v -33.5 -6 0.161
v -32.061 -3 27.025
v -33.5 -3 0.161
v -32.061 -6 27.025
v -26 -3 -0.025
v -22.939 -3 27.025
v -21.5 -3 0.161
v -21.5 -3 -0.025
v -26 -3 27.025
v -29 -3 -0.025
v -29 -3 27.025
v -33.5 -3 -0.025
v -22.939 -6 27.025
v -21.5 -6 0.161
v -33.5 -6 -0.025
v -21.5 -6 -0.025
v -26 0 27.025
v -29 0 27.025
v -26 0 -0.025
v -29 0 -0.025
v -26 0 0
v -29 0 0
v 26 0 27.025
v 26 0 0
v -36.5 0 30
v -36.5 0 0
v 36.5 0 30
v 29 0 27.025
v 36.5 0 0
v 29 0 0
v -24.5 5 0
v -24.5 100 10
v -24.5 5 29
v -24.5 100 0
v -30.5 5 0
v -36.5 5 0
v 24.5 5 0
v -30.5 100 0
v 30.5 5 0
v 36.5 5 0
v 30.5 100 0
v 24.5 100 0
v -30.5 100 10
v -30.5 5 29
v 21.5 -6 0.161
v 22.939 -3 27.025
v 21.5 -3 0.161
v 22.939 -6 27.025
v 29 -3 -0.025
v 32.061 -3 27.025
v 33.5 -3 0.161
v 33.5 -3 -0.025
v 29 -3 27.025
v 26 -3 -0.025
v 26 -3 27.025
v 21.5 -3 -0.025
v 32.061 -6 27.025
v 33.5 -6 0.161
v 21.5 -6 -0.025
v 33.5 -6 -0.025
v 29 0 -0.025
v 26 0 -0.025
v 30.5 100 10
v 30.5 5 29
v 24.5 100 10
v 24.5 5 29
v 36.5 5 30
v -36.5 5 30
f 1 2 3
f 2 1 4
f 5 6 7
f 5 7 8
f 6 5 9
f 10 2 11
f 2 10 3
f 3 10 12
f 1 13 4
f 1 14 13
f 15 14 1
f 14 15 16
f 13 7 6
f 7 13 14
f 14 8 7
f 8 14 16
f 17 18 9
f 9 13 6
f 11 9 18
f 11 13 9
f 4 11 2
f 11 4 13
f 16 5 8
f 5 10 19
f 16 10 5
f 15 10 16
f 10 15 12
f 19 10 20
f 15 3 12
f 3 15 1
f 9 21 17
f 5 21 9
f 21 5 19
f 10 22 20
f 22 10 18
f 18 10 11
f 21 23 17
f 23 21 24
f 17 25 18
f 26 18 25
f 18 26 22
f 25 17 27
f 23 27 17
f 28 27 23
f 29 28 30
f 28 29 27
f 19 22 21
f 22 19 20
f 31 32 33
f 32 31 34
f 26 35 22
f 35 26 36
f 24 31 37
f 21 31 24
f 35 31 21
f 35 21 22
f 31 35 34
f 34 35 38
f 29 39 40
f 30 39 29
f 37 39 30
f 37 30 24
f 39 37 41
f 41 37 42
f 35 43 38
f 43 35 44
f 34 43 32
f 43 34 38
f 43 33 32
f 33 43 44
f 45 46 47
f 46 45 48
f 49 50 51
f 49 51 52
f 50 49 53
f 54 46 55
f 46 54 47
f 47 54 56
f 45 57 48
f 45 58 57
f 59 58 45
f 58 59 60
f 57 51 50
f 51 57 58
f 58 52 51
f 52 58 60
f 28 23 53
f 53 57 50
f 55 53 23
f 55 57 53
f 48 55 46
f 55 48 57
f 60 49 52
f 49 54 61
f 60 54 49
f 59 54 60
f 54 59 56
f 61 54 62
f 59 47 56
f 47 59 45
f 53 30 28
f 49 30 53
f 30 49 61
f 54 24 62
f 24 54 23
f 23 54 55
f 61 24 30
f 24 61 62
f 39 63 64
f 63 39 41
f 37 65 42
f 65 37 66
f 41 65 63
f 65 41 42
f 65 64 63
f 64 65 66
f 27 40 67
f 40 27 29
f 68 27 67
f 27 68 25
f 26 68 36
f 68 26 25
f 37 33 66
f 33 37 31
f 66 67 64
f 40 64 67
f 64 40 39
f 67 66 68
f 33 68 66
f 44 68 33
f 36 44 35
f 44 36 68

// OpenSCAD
// file: tslot.scad
include <config.scad>
use <GDMUtils.scad>



module lock_tab(h=30, wall=3, slop=0.0)
{
	s1 = 2*wall-slop/2;
	s2 = wall-slop/2;
	ang = atan(((s1-s2)/2)/(h-2));
	translate([0, -(1.5*wall), 0]) union () {
		intersection() {
			yrot( ang) translate([0,0,(h+5)/2])
				cube(size=[s1*2, wall-2*slop, h+10], center=true);
			yrot(-ang) translate([0,0,(h+5)/2])
				cube(size=[s1*2, wall-2*slop, h+10], center=true);
			translate([0,0,(h-wall-slop)/2])
				cube(size=[s1*2, wall-2*slop, h-wall-slop+0.05], center=true);
		}
	}
	translate([0, -(wall+slop/2)/2-0.05, (h-wall-slop)/2])
		cube(size=[wall-2*slop, wall+slop/2+0.1, h-wall-slop+0.05], center=true);
}
//lock_tab(h=30, wall=2, slop=-0.9);



module lock_slot(h=30, wall=3, backing=0, slop=0.3)
{
	s1 = 2*wall+slop/2;
	s2 = wall+slop/2;
	w = 2*s1+2*wall;
	d = wall*3+slop;
	ang = atan(((s1-s2)/2)/(h-2));
	translate([0, (d+backing)/2, 0]) {
		difference() {
			intersection() {
				yrot( ang) translate([0, 0, (h+5)/2])
					cube(size=[w, d+backing, h+10], center=true);
				yrot(-ang) translate([0, 0, (h+5)/2])
					cube(size=[w, d+backing, h+10], center=true);
				translate([0, 0, h/2])
					cube(size=[w, d+backing, h], center=true);
			}
			translate([0, (d+backing)/2+0.05, -0.05])
				lock_tab(h=h, wall=wall, slop=-slop);
		}
	}
}
//!lock_slot(h=30, wall=2, slop=0.5);



// vim: noexpandtab tabstop=4 shiftwidth=4 softtabstop=4 nowrap
// file: config.scad
snappy_version = 0.90;


platform_length = 110; // mm.  Must be a multiple of rack_tooth_size.
platform_width  = 150; // mm
platform_height =  40; // mm
platform_thick  =   7; // mm
rack_tooth_size =   5; // mm per tooth.

rail_length  = 150;    // mm
rail_height  =  50;    // mm
rail_thick   =   7;    // mm

motor_rail_length = 100; // mm

roller_thick =  12;    // mm
roller_diam  =  30;    // mm
roller_axle  =  15;    // mm
roller_base  =  12;    // mm
roller_angle =  30;    // degrees

joiner_angle =  30;    // degrees
joiner_width =  10;    // mm
joiner_slop  =   0.5;  // mm

// Currently configured for 3/8" ACME threaded rod and matching 11/16" nut
lifter_rod_diam   =   9.5; // mm
lifter_rod_length = 300.0; // mm
lifter_nut_size   =  17.4; // mm
lifter_nut_thick  =   9.3; // mm




// Commonly used derived values.  Don't change these.
rail_spacing = platform_width - joiner_width*4 - 10;
roller_spacing = rail_spacing-roller_diam+0.5;
rail_width = rail_spacing + joiner_width*2;



// vim: noexpandtab tabstop=4 shiftwidth=4 softtabstop=4 nowrap
// main file
include <config.scad>
use <GDMUtils.scad>
use <tslot.scad>


module support_leg(h=30, l=100, wall=3)
{
	ang = atan((h-10)/l);
	color("SandyBrown") union() {
		// Back wall.
		translate([0, 5/2, h/2])
			cube(size=[platform_length/2+6*wall, 5, h], center=true);

		// T-slot tabs.
		grid_of(xa=[-platform_length/4, platform_length/4]) {
			lock_tab(h=h, wall=wall);

			// Legs.
			translate([0, 0, h]) {
				difference() {
					translate([-wall, 0, -h])
						cube(size=[2*wall, l, h], center=false);
					xrot(-ang) translate([-wall*1.5, 0, 0])
						cube(size=[3*wall, l*sqrt(2), h], center=false);
				}
			}
		}
	}
}
//!support_leg();



module support_leg_part() { // make me
	support_leg();
}



support_leg_part();



// vim: noexpandtab tabstop=4 shiftwidth=4 softtabstop=4 nowrap
